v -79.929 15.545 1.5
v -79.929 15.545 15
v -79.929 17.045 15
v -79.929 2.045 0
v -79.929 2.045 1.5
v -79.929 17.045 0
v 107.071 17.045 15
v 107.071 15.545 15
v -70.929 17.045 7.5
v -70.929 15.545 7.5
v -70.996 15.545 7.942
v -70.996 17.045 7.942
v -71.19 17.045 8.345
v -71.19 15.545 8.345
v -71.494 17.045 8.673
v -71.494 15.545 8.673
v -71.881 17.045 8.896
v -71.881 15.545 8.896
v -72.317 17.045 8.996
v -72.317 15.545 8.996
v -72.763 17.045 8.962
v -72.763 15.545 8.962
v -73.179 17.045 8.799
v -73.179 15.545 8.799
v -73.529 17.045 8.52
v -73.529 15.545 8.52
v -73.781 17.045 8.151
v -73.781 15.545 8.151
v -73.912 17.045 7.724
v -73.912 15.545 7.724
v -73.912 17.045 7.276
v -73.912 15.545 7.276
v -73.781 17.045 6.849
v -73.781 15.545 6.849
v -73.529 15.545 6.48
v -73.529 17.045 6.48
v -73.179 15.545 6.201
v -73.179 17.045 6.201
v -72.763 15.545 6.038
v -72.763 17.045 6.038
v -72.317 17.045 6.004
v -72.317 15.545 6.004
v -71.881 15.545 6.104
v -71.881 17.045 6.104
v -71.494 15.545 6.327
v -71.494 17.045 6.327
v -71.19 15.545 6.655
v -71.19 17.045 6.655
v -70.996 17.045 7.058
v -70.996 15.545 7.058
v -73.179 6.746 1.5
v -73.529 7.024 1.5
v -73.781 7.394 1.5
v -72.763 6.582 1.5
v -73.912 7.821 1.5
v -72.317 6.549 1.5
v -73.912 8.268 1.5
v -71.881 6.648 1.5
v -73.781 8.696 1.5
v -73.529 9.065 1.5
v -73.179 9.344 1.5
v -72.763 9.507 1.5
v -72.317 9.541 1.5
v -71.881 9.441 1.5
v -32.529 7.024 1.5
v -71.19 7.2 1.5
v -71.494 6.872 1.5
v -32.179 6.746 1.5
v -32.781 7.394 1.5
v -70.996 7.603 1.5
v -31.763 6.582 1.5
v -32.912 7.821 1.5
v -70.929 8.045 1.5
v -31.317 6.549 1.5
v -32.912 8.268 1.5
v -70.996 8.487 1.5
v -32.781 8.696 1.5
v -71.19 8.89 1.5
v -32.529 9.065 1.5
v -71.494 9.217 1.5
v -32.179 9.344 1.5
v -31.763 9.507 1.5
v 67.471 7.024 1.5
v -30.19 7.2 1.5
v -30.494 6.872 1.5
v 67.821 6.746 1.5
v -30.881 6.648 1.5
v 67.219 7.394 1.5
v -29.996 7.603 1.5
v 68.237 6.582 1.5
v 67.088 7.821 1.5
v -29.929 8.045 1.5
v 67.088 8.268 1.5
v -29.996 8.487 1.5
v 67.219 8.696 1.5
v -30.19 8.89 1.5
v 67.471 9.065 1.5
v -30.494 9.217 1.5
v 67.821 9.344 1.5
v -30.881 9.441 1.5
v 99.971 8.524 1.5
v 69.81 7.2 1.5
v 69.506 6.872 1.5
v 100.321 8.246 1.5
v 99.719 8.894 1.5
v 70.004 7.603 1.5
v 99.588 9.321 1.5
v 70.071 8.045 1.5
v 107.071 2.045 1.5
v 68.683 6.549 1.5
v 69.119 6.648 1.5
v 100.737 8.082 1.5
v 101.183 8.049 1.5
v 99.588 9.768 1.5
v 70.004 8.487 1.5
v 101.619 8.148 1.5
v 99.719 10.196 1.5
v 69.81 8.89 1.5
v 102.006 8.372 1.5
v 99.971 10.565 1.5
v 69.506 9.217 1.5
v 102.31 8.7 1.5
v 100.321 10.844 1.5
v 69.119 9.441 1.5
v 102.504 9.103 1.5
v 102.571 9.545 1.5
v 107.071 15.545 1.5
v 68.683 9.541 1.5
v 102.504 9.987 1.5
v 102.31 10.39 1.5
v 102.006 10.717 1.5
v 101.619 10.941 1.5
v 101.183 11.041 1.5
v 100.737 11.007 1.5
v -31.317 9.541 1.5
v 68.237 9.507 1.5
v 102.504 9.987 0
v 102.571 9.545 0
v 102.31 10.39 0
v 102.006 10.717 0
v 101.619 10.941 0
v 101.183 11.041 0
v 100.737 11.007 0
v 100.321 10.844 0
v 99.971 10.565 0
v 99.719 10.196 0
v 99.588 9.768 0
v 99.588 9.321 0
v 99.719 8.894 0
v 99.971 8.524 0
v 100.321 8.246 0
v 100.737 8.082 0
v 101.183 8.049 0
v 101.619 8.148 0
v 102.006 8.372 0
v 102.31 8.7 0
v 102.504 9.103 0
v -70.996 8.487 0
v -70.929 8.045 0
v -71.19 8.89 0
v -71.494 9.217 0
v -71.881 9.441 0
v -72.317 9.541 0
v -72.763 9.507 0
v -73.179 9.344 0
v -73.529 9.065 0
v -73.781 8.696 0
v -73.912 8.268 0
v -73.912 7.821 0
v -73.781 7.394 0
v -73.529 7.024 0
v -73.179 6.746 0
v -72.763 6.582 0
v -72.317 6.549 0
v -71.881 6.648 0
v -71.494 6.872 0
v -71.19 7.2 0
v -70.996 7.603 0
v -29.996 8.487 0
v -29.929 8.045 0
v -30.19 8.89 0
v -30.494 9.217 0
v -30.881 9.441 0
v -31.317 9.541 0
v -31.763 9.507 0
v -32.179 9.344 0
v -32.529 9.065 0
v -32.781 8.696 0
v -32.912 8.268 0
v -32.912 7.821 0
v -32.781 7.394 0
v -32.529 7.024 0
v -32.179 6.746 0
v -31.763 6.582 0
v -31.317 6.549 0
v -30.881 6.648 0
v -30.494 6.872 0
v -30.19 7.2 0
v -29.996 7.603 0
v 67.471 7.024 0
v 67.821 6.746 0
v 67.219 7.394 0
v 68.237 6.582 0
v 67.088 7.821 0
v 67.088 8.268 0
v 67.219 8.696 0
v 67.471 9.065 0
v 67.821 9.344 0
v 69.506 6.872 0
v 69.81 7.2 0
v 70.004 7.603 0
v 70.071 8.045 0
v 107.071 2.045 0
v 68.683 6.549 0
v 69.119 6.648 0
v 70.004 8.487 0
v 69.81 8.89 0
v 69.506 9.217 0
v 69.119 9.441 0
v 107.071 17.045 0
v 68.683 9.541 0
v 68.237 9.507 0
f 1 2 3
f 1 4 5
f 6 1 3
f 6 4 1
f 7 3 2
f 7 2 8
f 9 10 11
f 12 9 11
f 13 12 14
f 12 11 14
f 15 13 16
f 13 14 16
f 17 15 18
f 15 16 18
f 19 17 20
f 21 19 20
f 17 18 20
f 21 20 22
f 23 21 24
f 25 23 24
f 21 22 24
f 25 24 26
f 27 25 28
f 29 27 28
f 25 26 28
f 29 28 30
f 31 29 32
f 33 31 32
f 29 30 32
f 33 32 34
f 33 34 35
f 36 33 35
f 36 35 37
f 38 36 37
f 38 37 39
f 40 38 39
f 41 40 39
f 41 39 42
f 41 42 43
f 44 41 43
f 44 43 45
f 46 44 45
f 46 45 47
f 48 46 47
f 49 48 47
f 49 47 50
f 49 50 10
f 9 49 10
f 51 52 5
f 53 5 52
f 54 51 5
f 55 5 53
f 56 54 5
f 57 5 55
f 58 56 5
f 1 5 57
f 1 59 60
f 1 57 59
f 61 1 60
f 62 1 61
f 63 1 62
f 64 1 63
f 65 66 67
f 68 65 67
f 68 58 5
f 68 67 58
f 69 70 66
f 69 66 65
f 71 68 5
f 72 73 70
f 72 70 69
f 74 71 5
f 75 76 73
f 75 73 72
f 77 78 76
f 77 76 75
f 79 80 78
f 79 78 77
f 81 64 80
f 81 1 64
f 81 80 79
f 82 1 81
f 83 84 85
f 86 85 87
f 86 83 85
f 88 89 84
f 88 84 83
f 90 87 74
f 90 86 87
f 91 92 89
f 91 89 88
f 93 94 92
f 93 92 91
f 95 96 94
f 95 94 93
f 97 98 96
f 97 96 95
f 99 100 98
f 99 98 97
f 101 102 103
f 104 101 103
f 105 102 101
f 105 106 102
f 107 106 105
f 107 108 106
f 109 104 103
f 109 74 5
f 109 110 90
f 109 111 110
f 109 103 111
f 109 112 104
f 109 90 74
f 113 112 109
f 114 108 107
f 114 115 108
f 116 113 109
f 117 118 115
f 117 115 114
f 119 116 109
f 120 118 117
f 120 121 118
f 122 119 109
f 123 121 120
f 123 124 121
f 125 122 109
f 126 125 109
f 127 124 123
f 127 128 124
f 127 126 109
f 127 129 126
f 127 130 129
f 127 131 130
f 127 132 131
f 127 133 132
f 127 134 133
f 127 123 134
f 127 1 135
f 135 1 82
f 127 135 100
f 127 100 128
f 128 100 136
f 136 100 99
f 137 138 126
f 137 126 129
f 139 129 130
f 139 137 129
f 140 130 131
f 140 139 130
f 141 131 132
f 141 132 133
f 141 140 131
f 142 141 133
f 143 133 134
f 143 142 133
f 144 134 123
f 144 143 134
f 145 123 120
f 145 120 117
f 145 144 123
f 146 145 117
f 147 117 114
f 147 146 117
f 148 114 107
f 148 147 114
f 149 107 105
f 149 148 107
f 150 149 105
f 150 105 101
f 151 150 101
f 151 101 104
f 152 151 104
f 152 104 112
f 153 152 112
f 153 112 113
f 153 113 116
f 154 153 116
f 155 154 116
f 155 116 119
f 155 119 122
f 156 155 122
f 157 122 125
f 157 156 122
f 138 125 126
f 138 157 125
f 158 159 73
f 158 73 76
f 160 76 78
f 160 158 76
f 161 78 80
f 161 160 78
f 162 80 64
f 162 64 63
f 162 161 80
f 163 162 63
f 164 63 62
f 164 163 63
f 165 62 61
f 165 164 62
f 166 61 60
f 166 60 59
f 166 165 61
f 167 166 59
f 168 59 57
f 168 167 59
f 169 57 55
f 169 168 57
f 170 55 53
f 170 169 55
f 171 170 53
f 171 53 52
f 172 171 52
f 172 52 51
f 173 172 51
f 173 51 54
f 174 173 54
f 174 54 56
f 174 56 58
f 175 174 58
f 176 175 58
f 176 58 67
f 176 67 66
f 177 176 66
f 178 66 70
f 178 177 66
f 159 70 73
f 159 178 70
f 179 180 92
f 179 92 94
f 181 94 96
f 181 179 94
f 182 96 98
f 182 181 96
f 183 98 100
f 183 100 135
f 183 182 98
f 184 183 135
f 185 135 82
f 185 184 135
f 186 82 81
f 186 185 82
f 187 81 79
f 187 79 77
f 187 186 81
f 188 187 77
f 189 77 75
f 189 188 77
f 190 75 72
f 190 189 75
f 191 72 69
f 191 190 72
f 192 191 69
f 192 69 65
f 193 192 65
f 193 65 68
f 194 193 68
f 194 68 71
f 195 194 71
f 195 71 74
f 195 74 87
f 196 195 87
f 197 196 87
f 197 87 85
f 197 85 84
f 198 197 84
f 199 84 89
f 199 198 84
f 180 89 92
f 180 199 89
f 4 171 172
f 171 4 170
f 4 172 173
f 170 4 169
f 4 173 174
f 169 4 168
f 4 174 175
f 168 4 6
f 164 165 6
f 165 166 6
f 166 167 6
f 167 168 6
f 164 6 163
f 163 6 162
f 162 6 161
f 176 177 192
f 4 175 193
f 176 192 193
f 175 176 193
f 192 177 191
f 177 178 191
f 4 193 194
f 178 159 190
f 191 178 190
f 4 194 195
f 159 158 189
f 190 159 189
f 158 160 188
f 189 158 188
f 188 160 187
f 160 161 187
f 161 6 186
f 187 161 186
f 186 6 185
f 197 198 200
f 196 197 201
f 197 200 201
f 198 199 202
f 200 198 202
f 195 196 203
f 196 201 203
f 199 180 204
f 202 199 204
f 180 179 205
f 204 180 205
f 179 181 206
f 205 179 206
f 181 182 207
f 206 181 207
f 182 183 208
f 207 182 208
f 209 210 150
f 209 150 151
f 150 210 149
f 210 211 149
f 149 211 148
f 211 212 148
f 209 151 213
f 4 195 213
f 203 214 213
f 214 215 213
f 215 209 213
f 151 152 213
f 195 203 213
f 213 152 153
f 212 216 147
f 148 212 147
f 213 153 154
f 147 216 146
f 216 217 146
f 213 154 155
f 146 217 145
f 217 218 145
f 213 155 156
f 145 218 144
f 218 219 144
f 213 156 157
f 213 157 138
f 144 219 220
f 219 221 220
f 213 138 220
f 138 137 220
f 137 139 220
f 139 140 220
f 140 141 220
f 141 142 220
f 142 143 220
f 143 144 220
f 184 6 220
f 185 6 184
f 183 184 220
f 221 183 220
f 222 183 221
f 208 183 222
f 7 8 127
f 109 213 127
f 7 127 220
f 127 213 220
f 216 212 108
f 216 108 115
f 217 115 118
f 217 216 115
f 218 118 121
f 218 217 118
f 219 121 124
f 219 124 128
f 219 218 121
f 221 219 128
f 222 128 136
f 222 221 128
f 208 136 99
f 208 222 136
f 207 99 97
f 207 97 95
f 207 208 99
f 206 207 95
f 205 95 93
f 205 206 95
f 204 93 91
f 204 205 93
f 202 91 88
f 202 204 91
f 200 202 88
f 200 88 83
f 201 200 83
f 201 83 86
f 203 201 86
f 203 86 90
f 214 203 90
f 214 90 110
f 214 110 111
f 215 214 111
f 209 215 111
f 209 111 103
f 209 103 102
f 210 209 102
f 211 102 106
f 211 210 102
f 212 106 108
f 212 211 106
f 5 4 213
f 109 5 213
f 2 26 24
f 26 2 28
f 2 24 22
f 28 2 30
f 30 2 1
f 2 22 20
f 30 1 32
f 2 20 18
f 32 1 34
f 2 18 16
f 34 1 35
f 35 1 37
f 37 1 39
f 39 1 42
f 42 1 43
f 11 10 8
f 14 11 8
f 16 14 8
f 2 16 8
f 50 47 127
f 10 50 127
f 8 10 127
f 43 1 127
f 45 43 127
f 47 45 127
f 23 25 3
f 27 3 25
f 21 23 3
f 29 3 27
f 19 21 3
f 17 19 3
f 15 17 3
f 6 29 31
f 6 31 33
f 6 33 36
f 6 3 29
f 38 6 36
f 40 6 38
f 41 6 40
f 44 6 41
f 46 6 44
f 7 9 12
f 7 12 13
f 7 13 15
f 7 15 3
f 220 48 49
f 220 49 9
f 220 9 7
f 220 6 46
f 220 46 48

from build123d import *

# Parameters (mm, degrees)
ESQUISSE1_W      = 187
ESQUISSE1_H      = 15
ESQUISSE1_R      = 1.5
EXTRUSION1_DEPTH = 1.5
ESQUISSE3_W      = 187
ESQUISSE3_H      = 1.5
EXTRUSION3_DEPTH = 13.5
ESQUISSE4_R      = 1.5
EXTRUSION4_DEPTH = 10


with BuildPart() as part:
    # Esquisse1 → Extrusion1 (new body)
    with BuildSketch(Plane.XY):
        with Locations((13.570945199, 9.544736842)):
            Rectangle(ESQUISSE1_W, ESQUISSE1_H)
        with Locations((101.070945199, 9.544736842)):
            Circle(ESQUISSE1_R, mode=Mode.SUBTRACT)
        with Locations((-72.429054801, 8.044736842)):
            Circle(ESQUISSE1_R, mode=Mode.SUBTRACT)
        with Locations((-31.429054801, 8.044736842)):
            Circle(ESQUISSE1_R, mode=Mode.SUBTRACT)
        with Locations((68.570945199, 8.044736842)):
            Circle(ESQUISSE1_R, mode=Mode.SUBTRACT)
    extrude(amount=EXTRUSION1_DEPTH)

    # Esquisse3 → Extrusion3 (add)
    with BuildSketch(Plane.XY.offset(1.5)):
        with Locations((13.570945199, 16.294736842)):
            Rectangle(ESQUISSE3_W, ESQUISSE3_H)
    extrude(amount=EXTRUSION3_DEPTH)

    # Esquisse4 → Extrusion4 (cut)
    with BuildSketch(Plane.XZ.offset(-15.544736842)):
        with Locations((-72.429054801, 7.5)):
            Circle(ESQUISSE4_R)
    extrude(amount=-EXTRUSION4_DEPTH, mode=Mode.SUBTRACT)


solid = part.part
